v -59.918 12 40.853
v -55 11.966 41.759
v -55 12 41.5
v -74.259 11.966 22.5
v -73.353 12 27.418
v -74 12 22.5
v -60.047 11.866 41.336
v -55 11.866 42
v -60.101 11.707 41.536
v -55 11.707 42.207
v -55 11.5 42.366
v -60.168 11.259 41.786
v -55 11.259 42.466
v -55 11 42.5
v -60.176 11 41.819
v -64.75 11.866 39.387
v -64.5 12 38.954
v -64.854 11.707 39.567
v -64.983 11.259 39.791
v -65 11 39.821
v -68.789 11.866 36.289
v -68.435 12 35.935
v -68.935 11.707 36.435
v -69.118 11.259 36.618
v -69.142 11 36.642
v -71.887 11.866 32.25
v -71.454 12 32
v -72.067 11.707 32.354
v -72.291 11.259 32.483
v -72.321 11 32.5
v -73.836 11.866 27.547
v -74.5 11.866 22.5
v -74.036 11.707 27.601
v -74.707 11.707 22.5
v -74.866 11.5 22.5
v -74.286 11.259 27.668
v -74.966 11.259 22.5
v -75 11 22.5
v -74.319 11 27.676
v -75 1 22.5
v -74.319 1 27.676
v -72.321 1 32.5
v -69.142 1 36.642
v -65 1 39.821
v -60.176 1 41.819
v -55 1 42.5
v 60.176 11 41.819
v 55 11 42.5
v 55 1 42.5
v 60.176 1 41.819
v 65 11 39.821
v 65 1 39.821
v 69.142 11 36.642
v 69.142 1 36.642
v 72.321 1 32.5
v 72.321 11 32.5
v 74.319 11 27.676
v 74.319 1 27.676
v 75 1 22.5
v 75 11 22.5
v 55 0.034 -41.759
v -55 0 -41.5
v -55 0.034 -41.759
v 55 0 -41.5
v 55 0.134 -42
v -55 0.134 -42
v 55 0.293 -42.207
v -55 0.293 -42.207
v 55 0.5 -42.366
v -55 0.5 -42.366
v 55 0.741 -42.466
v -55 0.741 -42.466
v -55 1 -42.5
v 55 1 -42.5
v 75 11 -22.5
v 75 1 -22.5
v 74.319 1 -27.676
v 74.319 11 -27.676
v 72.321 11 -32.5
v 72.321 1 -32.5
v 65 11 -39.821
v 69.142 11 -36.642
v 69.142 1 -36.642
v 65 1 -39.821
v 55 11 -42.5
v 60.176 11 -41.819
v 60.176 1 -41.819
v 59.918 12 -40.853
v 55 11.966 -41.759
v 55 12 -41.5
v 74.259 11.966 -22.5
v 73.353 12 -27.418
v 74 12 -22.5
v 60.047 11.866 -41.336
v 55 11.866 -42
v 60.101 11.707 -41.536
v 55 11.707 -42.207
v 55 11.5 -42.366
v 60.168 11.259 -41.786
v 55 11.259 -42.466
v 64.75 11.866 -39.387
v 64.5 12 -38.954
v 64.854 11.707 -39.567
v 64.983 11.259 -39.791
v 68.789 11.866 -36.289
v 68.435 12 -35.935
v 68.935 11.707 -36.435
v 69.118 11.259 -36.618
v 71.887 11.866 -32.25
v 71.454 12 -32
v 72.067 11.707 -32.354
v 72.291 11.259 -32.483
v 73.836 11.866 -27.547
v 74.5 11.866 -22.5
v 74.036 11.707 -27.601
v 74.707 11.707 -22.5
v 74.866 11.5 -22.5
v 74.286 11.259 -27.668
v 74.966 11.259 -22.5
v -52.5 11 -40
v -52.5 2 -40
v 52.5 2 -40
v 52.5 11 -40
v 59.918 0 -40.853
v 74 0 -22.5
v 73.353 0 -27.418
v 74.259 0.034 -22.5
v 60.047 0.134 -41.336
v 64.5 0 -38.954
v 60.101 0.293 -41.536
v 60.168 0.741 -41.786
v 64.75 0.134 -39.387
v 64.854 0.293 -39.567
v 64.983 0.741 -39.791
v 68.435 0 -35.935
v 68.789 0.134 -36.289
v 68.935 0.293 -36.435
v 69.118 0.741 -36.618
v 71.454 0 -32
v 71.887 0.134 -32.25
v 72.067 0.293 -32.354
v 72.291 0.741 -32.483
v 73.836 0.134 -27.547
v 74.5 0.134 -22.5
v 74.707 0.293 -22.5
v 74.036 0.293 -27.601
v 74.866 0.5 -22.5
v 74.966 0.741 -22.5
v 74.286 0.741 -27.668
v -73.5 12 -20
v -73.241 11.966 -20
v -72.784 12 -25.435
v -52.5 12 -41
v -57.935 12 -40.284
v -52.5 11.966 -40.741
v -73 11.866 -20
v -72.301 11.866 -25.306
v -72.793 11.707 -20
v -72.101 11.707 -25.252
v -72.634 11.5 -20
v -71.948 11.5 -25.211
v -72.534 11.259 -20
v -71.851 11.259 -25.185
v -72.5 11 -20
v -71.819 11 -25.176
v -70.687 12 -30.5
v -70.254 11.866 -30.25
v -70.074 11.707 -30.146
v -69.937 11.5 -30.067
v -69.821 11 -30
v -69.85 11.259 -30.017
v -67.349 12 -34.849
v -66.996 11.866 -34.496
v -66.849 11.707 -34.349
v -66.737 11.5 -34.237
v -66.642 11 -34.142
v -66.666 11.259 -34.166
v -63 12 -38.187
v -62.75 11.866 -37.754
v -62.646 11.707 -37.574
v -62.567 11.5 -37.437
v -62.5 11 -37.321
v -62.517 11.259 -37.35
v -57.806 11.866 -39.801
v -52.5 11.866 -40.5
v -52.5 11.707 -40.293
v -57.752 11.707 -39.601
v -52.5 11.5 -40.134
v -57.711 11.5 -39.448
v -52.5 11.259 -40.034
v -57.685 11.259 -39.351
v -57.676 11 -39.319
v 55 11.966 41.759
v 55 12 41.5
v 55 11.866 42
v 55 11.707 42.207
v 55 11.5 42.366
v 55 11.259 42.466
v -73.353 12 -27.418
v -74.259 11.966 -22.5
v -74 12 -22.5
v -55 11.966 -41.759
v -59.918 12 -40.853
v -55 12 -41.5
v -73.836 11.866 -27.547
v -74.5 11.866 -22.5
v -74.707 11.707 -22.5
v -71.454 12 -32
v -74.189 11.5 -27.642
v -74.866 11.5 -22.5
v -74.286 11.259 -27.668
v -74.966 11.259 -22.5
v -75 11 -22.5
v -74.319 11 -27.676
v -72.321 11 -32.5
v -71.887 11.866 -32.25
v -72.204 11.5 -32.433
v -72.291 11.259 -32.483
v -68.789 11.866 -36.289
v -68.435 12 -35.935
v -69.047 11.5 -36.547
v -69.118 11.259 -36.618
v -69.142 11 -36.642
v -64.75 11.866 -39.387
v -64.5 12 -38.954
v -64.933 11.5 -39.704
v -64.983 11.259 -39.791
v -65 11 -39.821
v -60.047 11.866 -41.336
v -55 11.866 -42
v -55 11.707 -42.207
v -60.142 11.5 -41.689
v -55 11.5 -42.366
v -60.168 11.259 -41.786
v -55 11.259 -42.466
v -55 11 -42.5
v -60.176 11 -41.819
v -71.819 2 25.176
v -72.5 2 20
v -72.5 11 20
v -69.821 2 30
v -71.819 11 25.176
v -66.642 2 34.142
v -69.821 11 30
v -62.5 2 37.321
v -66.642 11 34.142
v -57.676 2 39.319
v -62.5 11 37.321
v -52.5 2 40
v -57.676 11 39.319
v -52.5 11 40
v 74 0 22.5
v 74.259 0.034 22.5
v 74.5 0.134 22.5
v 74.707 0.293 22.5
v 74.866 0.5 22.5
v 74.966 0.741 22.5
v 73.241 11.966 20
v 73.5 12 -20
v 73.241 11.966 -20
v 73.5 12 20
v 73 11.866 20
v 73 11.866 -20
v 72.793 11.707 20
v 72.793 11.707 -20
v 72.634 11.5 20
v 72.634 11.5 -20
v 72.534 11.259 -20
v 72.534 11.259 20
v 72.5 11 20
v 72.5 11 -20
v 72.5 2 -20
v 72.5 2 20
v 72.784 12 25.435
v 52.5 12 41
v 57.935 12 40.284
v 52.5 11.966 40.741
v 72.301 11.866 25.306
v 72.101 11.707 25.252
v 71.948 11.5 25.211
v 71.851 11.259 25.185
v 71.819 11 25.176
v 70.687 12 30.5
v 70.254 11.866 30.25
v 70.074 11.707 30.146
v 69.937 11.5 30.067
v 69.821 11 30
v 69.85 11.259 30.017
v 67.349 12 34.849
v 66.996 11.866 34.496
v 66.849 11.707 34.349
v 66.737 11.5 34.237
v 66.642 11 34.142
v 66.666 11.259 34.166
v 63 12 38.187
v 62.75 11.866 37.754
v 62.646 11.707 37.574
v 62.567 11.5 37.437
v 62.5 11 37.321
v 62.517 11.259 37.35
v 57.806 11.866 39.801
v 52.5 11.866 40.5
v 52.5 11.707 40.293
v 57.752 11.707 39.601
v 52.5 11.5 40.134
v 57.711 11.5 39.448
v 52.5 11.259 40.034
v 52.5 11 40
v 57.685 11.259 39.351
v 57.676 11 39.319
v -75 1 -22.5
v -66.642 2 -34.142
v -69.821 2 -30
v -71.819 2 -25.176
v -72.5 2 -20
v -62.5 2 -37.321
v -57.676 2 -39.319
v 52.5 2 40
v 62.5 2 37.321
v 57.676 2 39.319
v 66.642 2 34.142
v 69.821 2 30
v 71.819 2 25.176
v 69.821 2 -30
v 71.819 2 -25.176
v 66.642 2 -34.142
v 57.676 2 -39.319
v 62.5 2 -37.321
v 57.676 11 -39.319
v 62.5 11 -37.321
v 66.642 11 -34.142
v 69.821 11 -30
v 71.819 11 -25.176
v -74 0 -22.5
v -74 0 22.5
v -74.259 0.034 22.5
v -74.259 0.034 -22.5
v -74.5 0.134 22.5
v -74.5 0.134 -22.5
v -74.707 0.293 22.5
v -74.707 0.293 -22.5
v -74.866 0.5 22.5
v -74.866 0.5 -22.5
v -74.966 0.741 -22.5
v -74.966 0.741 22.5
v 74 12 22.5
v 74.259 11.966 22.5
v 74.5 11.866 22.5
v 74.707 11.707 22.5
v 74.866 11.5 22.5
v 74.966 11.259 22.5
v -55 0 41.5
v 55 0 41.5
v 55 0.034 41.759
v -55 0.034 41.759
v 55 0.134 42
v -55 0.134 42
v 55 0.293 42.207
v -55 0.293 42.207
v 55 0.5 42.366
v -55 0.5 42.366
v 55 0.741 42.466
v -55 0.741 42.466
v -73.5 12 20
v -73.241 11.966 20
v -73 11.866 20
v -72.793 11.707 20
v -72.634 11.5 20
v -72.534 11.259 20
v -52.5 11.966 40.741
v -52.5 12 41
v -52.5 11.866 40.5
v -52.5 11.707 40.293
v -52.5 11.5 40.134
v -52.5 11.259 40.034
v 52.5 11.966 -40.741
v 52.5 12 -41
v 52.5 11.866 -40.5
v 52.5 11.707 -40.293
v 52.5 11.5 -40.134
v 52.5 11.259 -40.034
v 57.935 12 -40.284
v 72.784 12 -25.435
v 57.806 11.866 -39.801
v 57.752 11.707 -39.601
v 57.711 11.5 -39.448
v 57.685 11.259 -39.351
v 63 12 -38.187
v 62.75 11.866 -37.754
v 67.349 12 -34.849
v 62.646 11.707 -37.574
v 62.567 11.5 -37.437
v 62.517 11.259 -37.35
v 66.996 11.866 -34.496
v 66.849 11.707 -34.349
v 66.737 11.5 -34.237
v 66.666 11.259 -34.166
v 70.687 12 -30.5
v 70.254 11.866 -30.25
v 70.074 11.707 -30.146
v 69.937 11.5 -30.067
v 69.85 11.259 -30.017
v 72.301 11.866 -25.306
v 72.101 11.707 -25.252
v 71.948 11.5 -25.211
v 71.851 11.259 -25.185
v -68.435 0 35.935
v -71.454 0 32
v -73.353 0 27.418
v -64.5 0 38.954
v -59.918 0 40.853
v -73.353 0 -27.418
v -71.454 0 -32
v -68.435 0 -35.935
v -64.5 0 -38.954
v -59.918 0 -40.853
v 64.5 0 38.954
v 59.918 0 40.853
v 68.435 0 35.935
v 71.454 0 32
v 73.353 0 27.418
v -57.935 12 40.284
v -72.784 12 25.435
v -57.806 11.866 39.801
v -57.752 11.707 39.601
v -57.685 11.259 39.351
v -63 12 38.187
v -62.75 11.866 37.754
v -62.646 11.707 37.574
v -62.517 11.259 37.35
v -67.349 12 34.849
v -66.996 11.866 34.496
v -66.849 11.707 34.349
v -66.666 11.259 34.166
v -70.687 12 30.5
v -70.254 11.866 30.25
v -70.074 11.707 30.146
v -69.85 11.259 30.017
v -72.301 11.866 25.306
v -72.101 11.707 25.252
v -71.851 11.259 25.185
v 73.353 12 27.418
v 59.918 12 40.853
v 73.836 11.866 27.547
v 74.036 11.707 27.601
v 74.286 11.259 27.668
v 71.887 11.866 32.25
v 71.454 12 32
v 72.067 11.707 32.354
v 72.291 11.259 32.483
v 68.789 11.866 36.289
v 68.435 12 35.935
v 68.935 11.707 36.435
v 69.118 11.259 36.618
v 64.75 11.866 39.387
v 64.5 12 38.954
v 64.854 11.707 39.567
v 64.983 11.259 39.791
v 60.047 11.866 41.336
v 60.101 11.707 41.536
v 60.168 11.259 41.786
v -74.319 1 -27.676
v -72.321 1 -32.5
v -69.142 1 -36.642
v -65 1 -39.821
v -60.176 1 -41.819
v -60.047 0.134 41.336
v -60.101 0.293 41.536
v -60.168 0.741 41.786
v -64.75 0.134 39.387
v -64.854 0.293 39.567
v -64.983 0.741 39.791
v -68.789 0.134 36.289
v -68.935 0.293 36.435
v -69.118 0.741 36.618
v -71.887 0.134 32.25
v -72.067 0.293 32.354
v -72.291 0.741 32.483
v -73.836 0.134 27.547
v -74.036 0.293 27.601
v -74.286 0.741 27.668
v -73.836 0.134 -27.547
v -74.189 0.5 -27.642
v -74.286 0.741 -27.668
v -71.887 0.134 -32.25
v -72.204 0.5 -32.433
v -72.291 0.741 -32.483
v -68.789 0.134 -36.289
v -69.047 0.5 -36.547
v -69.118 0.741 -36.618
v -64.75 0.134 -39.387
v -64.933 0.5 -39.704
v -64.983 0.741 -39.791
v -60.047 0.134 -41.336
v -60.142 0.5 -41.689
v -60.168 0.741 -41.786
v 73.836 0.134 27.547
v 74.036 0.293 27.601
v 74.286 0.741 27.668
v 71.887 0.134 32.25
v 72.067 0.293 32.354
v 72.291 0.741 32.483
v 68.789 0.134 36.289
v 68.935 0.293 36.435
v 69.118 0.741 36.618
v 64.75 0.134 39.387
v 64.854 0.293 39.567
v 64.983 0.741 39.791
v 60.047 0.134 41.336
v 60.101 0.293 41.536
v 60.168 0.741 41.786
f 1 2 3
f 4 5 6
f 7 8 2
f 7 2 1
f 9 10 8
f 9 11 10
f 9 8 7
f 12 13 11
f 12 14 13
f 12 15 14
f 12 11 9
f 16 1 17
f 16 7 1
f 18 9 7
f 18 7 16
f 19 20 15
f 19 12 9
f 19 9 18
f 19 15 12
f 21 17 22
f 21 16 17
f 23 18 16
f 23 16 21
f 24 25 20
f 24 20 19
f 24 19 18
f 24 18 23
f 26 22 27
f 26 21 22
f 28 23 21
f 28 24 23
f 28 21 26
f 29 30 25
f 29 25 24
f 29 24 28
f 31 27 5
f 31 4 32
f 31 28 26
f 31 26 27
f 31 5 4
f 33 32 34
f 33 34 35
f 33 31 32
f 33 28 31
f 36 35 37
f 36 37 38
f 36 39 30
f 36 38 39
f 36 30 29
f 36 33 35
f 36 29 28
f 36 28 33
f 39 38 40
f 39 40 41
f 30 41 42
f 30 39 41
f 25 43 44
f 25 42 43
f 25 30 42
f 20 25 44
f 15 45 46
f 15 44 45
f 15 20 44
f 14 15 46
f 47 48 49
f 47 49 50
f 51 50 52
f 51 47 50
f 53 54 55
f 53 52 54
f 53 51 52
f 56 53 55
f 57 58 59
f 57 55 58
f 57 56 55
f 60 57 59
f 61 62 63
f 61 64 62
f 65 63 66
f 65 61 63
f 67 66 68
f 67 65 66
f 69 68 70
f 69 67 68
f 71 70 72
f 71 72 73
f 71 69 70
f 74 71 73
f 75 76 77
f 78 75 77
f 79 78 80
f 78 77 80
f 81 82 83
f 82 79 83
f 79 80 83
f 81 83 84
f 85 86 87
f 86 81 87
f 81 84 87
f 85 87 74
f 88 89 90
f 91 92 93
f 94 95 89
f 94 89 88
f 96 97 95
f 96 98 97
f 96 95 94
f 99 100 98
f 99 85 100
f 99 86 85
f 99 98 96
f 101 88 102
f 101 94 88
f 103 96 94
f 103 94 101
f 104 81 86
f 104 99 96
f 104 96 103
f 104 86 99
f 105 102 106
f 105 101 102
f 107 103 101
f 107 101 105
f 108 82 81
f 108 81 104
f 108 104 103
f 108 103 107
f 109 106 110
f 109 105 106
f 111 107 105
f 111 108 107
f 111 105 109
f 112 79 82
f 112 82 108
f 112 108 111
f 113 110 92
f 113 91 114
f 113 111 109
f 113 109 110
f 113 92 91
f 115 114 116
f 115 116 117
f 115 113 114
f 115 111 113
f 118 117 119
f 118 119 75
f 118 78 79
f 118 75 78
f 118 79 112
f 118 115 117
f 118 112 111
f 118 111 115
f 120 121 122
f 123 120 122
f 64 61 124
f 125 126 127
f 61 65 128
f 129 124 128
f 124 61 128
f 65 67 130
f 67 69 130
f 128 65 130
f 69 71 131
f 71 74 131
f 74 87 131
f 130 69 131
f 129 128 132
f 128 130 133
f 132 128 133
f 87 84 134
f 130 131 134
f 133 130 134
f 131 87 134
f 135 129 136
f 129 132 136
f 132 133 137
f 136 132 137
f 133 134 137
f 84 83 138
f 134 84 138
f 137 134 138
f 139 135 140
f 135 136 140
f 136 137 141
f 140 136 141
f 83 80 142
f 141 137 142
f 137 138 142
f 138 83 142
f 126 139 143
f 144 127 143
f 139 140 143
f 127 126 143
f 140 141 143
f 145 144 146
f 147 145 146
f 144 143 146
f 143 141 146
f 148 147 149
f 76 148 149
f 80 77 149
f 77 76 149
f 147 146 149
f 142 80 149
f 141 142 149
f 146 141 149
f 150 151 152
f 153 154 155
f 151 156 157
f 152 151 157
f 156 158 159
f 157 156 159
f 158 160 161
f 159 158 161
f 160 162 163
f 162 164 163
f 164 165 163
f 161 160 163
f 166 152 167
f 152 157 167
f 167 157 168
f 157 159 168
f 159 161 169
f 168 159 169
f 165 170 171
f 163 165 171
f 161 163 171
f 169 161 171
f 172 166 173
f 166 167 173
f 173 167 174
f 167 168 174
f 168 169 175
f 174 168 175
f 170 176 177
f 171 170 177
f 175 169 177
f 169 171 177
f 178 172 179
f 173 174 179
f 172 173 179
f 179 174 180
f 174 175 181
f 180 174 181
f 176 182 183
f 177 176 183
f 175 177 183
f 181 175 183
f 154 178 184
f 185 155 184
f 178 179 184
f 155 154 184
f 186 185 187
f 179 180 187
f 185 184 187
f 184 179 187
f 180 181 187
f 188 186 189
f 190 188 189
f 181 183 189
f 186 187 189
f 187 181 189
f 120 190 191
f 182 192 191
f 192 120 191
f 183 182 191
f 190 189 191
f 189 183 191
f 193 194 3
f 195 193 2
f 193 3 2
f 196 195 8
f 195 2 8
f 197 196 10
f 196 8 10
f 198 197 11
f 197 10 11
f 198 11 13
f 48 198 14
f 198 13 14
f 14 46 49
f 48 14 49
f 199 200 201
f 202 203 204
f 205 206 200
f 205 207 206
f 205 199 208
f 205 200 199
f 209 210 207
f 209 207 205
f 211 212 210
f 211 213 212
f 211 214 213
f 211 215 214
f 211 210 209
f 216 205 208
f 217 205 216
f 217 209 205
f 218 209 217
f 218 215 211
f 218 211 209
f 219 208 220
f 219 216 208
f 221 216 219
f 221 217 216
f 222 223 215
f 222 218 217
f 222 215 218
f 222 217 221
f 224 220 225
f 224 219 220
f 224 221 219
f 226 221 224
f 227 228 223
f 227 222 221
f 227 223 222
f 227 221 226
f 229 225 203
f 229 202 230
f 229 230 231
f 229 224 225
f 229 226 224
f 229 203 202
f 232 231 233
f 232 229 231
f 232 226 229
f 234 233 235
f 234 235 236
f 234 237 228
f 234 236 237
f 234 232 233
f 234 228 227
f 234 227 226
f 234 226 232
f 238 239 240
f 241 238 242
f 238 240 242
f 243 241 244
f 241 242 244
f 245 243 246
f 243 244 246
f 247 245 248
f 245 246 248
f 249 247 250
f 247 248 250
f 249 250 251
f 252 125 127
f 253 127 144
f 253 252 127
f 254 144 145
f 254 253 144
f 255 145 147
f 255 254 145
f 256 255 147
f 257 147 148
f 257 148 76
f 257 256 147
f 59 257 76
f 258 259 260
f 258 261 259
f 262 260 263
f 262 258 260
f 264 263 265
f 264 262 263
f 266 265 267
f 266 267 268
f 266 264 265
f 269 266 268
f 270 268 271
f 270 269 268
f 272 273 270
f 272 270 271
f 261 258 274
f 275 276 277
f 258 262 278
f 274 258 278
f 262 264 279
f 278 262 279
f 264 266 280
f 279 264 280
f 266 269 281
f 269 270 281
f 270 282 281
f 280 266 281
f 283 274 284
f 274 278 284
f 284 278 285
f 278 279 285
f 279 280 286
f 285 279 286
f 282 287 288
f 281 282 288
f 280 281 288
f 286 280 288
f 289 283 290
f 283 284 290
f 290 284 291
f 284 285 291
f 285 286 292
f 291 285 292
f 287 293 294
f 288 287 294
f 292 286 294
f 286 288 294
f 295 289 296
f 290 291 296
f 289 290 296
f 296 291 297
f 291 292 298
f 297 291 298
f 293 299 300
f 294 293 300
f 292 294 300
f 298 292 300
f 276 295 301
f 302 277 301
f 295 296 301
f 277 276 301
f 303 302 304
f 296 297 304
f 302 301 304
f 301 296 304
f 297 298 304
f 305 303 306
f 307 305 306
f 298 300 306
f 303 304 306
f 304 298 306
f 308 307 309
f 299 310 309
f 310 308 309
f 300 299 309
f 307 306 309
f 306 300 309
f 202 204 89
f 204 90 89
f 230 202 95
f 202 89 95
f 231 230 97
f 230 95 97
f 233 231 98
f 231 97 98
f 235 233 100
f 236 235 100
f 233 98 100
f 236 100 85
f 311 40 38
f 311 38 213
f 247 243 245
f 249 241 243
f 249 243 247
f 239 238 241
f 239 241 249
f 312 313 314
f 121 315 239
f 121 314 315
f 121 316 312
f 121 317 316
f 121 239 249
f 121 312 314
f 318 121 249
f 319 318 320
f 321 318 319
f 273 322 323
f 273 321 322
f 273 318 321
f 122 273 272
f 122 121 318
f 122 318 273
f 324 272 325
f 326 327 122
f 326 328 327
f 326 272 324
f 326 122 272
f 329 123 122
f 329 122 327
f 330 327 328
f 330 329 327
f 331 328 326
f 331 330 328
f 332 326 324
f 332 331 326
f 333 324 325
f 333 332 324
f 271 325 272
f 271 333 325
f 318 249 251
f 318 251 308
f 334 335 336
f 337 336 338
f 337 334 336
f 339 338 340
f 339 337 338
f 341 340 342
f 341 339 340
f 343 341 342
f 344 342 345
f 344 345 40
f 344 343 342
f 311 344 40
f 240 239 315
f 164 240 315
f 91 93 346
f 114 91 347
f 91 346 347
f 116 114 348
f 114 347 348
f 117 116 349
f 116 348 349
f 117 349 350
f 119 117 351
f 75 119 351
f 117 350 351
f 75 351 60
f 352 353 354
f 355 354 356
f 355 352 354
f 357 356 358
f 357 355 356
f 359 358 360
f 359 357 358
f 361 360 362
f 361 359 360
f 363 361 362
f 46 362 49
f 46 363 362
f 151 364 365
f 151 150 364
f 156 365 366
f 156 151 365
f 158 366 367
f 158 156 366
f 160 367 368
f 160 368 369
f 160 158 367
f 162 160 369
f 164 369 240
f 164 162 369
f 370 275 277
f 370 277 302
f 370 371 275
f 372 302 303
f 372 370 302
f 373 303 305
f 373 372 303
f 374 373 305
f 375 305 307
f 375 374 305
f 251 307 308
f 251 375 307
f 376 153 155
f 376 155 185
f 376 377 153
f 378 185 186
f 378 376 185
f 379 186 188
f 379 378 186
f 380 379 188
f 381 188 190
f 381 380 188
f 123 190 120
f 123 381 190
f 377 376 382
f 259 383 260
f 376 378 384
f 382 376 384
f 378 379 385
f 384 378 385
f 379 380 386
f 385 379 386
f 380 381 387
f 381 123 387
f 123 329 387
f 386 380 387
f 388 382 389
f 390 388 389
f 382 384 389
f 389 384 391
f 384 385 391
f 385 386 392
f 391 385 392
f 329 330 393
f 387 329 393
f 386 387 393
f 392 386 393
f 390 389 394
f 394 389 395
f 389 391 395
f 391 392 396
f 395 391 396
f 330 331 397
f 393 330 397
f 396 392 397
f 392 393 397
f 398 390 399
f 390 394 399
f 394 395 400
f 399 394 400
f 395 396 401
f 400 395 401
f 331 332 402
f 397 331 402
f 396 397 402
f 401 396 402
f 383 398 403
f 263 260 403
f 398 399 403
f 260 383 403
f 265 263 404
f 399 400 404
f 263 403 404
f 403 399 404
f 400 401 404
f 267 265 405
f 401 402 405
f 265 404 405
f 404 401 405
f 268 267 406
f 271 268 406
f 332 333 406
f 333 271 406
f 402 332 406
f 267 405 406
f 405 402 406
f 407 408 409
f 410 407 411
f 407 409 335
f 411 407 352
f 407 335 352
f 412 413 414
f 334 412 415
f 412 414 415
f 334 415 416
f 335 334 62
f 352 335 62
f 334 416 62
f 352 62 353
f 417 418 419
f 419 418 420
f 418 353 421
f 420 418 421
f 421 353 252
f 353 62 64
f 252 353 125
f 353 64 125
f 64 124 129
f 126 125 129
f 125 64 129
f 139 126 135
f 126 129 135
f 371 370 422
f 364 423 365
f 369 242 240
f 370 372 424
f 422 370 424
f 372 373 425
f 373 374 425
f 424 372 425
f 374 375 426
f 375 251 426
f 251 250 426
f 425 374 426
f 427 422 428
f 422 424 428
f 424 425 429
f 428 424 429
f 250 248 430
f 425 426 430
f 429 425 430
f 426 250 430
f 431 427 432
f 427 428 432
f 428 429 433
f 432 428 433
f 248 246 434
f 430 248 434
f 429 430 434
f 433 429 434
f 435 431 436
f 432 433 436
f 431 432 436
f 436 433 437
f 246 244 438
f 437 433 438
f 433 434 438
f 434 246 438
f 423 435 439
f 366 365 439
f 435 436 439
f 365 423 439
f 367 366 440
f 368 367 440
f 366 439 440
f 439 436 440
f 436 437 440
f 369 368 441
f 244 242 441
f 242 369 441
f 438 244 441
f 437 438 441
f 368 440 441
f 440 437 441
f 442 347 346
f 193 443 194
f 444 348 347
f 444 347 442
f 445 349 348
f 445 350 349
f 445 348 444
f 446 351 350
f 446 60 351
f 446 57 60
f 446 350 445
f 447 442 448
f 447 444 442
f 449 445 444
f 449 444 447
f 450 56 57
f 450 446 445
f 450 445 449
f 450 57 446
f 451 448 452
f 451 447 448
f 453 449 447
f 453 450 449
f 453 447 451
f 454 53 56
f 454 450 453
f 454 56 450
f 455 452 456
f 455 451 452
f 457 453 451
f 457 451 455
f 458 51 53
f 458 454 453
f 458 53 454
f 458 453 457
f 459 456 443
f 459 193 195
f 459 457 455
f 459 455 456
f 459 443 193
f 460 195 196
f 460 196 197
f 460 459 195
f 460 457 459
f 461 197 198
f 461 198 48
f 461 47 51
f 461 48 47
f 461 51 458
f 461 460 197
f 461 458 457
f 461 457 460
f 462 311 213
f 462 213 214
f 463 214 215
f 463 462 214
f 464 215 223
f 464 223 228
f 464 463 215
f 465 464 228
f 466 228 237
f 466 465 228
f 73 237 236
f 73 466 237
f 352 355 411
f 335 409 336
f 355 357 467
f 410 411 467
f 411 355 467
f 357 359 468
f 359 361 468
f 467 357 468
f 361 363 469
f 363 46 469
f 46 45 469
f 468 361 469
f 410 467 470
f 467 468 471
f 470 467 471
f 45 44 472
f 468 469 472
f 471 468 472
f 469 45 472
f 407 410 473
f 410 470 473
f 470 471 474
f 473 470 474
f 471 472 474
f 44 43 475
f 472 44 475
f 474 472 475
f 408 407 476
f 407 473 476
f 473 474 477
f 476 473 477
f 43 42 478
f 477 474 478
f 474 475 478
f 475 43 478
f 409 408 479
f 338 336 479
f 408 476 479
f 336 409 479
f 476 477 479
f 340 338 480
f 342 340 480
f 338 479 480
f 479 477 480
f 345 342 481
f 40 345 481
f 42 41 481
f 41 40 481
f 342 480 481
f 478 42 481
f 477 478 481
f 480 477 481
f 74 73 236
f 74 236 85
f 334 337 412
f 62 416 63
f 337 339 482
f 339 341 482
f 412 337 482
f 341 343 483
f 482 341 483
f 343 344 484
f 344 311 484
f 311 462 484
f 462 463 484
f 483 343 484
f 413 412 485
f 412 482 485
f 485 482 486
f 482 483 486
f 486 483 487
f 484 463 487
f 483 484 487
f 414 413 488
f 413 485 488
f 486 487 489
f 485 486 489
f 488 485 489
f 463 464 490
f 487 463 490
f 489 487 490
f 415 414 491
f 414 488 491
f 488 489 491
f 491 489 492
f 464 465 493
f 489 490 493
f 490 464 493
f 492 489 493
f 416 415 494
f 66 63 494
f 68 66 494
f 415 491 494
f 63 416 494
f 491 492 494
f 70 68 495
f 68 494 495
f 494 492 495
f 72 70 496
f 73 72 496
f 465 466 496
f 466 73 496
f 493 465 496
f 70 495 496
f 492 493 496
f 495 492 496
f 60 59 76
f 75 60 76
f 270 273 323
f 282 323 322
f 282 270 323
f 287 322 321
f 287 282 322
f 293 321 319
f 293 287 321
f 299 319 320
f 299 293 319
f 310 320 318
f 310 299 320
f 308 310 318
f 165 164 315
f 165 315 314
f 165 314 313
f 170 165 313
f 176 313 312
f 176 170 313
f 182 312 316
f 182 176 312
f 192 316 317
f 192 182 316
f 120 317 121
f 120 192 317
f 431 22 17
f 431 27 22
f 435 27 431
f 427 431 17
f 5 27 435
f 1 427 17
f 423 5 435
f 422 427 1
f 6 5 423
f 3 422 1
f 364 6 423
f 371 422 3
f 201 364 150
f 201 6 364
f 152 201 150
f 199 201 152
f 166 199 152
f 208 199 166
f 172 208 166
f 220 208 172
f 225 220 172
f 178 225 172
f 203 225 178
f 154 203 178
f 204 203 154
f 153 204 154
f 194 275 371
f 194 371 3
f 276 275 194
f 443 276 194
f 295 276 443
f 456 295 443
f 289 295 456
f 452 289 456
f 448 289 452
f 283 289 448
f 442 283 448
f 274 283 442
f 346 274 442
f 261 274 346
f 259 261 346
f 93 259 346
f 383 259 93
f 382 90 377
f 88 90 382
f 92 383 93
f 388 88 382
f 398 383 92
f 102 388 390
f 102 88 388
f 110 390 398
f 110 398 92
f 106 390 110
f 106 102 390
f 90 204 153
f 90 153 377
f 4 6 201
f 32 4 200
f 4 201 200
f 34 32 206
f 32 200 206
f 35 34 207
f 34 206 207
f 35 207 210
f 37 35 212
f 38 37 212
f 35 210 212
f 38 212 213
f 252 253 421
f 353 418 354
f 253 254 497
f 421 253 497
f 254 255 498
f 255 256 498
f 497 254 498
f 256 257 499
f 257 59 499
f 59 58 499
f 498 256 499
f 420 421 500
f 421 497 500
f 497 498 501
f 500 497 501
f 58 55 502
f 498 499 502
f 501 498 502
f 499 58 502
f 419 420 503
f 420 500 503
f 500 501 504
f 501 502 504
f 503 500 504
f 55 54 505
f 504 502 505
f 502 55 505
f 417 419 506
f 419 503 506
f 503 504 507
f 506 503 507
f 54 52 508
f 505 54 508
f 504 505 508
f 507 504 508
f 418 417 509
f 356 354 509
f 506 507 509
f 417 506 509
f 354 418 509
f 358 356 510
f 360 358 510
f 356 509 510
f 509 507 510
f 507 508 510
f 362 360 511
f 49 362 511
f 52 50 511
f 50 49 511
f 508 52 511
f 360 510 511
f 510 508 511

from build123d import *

# Parameters (mm, degrees)
SKETCH1_W           = 150
SKETCH1_H           = 85
BOSS_EXTRUDE1_DEPTH = 2
SKETCH2_W           = 150
SKETCH2_H           = 85
SKETCH2_W_2         = 145
SKETCH2_H_2         = 80
BOSS_EXTRUDE2_DEPTH = 10
FILLET1_R           = 20
FILLET2_R           = 1


with BuildPart() as part:
    # Sketch1 → Boss-Extrude1 (new body)
    with BuildSketch(Plane(origin=(0, 0, 0), x_dir=(1, 0, 0), z_dir=(0, 1, 0))):
        Rectangle(SKETCH1_W, SKETCH1_H)
    extrude(amount=BOSS_EXTRUDE1_DEPTH)

    # Sketch2 → Boss-Extrude2 (add)
    with BuildSketch(Plane(origin=(0, 2, 0), x_dir=(1, 0, 0), z_dir=(0, 1, 0))):
        Rectangle(SKETCH2_W, SKETCH2_H)
        Rectangle(SKETCH2_W_2, SKETCH2_H_2, mode=Mode.SUBTRACT)
    extrude(amount=BOSS_EXTRUDE2_DEPTH)

    # Fillet1
    fillet1_edges = [part.edges().sort_by_distance(p)[0] for p in [
        (72.5, 7, -40),
        (-72.5, 7, -40),
        (-72.5, 7, 40),
        (72.5, 7, 40),
        (75, 6, 42.5),
        (-75, 6, 42.5),
        (-75, 6, -42.5),
        (75, 6, -42.5),
    ]]
    fillet(fillet1_edges, radius=FILLET1_R)

    # Fillet2
    fillet2_edges = [part.edges().sort_by_distance(p)[0] for p in [
        (0, 0, -42.5),
        (0, 12, -42.5),
        (75, 0, 0),
        (0, 0, 42.5),
        (-75, 0, 0),
        (-69.142135624, 0, -36.642135624),
        (-69.142135624, 0, 36.642135624),
        (69.142135624, 0, 36.642135624),
        (69.142135624, 0, -36.642135624),
        (75, 12, 0),
        (0, 12, 42.5),
        (-75, 12, 0),
        (-72.5, 12, 0),
        (0, 12, 40),
        (72.5, 12, 0),
        (0, 12, -40),
        (-66.642135624, 12, 34.142135624),
        (66.642135624, 12, 34.142135624),
        (66.642135624, 12, -34.142135624),
        (-66.642135624, 12, -34.142135624),
        (-69.142135624, 12, -36.642135624),
        (-69.142135624, 12, 36.642135624),
        (69.142135624, 12, 36.642135624),
        (69.142135624, 12, -36.642135624),
    ]]
    fillet(fillet2_edges, radius=FILLET2_R)


solid = part.part
